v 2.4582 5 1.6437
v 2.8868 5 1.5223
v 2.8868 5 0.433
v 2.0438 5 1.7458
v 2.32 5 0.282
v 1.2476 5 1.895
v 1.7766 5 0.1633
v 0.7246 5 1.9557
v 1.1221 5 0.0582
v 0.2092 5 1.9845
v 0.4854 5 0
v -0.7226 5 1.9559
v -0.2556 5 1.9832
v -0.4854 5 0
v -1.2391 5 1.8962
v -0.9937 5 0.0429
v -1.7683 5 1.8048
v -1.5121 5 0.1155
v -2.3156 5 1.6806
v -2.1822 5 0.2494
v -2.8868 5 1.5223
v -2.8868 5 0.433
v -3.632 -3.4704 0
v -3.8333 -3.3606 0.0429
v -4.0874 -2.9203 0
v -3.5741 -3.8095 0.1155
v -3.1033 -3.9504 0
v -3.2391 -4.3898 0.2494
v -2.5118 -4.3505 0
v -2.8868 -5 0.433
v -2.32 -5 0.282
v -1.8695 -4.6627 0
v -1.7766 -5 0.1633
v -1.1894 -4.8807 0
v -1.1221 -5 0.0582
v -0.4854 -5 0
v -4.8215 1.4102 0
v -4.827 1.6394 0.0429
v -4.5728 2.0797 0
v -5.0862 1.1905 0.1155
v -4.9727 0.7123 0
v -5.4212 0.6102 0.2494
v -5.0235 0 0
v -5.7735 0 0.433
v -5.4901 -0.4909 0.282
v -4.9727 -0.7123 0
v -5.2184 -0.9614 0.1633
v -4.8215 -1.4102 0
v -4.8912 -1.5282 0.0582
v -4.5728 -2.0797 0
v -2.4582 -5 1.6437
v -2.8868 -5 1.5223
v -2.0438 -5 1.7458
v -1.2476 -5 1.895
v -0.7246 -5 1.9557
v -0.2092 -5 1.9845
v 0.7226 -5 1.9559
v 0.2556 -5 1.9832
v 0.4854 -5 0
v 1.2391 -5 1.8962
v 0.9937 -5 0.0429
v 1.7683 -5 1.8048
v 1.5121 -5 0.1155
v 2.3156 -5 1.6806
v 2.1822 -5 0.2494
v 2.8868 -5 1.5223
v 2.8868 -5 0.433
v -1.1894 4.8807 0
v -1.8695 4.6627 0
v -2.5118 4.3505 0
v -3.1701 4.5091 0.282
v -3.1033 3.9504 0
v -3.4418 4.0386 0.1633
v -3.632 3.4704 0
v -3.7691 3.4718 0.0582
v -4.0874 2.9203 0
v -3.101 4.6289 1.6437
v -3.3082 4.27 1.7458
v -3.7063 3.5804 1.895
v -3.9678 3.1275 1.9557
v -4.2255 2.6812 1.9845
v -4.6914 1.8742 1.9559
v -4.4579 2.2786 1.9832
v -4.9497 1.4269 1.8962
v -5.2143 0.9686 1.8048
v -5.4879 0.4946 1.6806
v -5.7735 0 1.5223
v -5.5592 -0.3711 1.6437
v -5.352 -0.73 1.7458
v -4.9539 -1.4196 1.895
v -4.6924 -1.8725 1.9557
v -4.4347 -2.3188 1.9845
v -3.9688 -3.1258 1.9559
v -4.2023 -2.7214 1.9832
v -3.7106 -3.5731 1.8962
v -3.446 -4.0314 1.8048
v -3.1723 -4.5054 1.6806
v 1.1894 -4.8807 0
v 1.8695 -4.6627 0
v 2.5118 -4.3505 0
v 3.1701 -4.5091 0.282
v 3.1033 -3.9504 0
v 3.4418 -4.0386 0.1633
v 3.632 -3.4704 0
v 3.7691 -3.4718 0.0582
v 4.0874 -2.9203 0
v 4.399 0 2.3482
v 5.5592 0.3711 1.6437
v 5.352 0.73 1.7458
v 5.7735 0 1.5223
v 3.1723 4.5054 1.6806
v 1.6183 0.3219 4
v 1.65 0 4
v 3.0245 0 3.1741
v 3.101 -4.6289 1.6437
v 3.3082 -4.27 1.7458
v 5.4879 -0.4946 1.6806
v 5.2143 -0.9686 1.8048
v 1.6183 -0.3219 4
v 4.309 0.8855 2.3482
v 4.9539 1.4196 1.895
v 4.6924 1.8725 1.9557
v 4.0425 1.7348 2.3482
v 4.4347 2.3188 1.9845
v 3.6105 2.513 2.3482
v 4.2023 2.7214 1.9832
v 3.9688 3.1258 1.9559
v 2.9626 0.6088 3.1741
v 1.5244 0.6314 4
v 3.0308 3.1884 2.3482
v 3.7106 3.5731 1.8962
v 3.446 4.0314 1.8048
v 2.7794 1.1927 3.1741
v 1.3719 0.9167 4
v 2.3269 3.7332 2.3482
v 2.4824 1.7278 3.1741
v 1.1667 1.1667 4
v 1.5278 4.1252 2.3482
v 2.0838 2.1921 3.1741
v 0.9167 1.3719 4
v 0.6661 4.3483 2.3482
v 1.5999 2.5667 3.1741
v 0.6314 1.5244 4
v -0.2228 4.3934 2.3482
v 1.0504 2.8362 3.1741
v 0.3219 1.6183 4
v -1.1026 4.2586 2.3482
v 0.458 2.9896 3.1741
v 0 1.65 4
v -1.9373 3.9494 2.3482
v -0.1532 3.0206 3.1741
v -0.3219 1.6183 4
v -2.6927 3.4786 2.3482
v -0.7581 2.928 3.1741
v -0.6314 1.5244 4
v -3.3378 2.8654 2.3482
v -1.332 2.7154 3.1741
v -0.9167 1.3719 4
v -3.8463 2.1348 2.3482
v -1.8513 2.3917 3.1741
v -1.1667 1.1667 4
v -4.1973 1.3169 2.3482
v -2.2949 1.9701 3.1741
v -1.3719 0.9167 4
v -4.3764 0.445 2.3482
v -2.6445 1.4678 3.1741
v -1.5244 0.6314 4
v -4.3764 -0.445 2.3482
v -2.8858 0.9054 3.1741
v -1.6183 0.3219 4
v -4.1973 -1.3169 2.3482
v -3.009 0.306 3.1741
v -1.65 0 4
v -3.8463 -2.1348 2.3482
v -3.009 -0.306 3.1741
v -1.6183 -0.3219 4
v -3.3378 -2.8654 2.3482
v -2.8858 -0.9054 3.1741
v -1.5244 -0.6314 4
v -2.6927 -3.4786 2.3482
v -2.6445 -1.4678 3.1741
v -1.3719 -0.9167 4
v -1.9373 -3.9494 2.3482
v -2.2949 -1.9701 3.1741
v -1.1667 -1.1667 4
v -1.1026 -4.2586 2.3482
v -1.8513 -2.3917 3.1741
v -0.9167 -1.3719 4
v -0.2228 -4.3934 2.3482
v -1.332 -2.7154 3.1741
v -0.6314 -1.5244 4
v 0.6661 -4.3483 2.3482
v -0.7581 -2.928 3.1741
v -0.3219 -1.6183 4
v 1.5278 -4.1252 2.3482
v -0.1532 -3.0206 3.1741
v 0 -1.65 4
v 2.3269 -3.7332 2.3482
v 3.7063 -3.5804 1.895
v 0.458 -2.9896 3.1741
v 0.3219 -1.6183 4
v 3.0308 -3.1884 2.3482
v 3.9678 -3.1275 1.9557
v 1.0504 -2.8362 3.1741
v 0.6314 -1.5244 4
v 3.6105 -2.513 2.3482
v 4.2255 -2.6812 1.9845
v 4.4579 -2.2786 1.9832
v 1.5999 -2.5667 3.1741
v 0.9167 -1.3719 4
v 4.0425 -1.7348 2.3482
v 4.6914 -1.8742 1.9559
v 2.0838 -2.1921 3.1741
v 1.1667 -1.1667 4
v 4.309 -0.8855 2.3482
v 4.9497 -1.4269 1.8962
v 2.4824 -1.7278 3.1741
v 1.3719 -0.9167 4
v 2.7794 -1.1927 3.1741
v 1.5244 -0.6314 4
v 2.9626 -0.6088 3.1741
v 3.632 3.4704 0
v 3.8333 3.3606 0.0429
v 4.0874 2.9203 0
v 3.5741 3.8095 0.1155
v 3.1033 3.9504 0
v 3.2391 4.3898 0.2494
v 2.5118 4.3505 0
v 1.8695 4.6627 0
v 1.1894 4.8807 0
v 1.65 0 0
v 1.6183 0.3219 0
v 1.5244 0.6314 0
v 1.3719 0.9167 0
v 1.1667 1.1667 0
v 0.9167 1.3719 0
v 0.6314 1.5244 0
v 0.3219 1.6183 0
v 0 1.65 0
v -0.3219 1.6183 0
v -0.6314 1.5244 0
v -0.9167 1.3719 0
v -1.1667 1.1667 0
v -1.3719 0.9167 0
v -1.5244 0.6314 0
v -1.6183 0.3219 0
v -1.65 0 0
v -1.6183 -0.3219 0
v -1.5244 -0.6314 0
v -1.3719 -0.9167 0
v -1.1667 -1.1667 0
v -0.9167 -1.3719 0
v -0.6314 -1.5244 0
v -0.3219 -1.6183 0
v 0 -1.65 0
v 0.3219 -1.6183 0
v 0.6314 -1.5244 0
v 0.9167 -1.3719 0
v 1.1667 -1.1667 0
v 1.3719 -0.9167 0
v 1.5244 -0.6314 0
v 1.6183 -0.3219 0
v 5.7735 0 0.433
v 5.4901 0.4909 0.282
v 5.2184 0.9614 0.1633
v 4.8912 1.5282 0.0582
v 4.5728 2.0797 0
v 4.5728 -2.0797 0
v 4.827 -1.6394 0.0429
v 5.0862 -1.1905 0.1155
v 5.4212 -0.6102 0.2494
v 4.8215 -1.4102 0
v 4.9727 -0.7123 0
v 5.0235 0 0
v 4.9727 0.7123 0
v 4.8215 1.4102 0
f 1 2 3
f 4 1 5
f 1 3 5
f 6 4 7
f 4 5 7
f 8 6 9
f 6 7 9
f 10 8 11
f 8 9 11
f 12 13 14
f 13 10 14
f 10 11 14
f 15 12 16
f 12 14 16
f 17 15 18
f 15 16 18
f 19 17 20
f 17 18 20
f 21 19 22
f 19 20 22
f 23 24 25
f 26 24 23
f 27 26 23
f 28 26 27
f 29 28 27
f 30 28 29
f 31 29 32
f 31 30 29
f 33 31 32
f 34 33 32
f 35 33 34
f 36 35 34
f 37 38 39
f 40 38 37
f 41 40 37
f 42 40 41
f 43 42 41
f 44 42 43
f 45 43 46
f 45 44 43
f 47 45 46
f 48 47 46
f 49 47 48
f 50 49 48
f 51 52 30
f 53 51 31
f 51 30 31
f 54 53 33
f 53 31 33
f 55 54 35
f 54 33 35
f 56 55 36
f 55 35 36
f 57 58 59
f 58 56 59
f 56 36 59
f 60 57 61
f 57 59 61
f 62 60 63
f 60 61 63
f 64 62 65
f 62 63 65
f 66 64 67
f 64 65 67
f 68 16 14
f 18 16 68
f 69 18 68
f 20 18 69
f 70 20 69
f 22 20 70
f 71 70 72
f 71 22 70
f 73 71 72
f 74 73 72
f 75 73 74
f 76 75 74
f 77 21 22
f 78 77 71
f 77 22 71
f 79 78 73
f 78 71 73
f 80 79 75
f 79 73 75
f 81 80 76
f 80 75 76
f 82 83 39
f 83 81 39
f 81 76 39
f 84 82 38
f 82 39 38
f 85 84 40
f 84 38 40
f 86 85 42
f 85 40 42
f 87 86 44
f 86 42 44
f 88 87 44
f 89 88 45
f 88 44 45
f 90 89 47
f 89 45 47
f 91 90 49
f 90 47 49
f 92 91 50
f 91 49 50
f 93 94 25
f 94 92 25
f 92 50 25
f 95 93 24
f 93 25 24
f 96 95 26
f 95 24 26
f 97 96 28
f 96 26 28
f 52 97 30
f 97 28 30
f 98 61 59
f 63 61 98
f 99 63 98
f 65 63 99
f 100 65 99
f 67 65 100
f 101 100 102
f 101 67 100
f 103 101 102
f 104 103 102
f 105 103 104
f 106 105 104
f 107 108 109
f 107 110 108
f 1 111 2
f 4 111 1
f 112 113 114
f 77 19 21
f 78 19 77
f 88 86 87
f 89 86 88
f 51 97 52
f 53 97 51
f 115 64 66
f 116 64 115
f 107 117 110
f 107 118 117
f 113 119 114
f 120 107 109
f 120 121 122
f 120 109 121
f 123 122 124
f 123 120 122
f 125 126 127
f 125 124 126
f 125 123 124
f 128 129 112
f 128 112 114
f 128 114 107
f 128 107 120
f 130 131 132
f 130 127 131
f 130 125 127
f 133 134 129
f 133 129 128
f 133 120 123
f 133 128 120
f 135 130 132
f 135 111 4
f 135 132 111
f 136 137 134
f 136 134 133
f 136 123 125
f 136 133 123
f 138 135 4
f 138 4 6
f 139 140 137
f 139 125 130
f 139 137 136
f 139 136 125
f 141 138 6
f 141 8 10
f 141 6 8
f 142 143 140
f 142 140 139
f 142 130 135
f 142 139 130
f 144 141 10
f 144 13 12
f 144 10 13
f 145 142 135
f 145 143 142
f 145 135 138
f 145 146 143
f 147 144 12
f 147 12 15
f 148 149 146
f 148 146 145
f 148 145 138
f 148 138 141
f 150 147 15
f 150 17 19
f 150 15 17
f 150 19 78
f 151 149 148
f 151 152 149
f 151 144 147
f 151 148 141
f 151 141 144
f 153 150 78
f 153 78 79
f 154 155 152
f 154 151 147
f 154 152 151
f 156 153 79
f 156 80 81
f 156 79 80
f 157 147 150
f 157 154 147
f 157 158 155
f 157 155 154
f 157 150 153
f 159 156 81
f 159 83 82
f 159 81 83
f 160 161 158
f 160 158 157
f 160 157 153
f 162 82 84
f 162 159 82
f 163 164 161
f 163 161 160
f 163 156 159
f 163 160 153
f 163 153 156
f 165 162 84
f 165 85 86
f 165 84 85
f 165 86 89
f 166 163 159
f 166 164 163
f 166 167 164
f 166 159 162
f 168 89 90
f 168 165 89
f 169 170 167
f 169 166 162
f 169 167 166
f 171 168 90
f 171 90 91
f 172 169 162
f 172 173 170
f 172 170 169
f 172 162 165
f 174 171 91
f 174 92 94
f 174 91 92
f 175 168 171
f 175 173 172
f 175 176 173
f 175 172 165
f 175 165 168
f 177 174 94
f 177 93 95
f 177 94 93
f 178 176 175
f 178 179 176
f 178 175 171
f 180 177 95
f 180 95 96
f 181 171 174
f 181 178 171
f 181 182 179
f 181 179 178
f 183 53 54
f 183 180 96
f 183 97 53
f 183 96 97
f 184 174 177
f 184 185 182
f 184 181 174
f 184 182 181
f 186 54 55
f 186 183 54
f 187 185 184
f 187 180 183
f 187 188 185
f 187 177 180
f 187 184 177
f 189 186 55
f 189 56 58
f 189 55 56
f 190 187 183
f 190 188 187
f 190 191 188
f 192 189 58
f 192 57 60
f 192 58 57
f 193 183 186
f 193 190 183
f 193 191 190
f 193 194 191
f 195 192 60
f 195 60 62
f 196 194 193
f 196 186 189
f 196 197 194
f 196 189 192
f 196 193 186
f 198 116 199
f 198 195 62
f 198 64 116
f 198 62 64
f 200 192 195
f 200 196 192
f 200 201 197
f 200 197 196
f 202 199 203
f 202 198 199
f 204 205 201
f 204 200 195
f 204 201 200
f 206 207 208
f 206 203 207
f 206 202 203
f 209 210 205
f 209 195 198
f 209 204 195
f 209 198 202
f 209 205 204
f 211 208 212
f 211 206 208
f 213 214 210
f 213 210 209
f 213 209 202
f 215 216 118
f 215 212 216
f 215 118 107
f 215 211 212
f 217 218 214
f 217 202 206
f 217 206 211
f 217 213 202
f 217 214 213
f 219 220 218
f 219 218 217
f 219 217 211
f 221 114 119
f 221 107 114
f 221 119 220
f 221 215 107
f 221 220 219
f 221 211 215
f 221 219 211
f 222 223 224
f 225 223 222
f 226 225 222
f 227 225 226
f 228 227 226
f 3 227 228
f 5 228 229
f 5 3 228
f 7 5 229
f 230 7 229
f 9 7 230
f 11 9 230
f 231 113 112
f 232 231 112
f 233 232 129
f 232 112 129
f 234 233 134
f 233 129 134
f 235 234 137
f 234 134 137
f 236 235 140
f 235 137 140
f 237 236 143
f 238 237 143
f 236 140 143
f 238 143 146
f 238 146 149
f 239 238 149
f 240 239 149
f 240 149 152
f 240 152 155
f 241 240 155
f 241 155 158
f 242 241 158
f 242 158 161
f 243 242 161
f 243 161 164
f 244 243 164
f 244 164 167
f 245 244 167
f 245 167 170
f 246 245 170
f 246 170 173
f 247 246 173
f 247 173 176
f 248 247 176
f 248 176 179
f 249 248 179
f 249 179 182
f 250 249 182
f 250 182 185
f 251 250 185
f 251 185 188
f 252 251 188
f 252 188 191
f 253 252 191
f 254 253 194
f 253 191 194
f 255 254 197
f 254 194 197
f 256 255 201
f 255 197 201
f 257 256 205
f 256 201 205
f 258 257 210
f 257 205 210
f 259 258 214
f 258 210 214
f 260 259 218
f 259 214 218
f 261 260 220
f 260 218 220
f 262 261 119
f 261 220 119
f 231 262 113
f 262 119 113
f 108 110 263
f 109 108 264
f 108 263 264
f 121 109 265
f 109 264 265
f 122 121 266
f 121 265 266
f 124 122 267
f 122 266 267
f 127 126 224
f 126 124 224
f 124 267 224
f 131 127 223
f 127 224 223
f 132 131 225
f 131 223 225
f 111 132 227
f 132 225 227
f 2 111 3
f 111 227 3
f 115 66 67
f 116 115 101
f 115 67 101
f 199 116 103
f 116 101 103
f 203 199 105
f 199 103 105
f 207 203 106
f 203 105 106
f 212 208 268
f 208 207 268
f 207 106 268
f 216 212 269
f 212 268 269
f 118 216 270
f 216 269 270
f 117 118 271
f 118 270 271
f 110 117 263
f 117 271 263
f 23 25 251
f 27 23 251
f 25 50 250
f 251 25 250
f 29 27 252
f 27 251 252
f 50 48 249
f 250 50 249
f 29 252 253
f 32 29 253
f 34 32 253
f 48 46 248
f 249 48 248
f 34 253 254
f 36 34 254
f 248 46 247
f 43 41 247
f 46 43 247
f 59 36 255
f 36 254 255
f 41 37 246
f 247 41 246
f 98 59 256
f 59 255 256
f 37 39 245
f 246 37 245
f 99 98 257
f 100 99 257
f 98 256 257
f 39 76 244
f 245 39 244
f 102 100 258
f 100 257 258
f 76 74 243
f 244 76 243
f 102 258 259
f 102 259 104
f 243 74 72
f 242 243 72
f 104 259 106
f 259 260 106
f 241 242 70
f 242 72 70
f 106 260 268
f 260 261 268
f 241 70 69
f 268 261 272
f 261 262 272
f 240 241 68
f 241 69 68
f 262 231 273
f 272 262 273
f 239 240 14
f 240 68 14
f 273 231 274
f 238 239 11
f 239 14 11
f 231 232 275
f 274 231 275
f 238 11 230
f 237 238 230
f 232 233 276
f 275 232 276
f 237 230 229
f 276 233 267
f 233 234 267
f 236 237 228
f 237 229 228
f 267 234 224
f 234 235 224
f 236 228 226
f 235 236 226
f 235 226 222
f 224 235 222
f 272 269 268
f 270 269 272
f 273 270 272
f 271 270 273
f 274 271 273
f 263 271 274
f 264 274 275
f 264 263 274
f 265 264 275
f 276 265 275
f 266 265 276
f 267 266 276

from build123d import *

# Parameters (mm, degrees)
BOSS_EXTRUDE1_DEPTH   = 4
M4X0_7_TAPPED_HOLE1_D = 3.3


with BuildPart() as part:
    # Sketch1 → Boss-Extrude1 (new body)
    with BuildSketch(Plane.XY):
        Polygon((-2.886751346, 5), (-5.773502692, 0), (-2.886751346, -5), (2.886751346, -5), (5.773502692, 0), (2.886751346, 5), align=None)
    extrude(amount=BOSS_EXTRUDE1_DEPTH)

    # M4x0.7 Tapped Hole1 (through all)
    with Locations(Plane(origin=(0, 0, 0), x_dir=(-1, 0, 0), z_dir=(0, 0, -1))):
        with Locations((0, 0)):
            Hole(M4X0_7_TAPPED_HOLE1_D / 2)

    # Sketch3 → Cut-Revolve3 (revolve, cut)
    with BuildSketch(Plane(origin=(0, 0, 0), x_dir=(1, 0, 0), z_dir=(0, 1, 0))):
        Polygon((6.057291813, -1.351831913), (1.65, -4), (6.057291813, -4), align=None)
    revolve(axis=Axis((0, 0, 4), (0, 0, 1)), mode=Mode.SUBTRACT)

    # Sketch5 → Cut-Revolve4 (revolve, cut)
    with BuildSketch(Plane(origin=(0, 0, 0), x_dir=(1, 0, 0), z_dir=(0, 1, 0))):
        Polygon((5.023502692, 0), (5.773502692, -0.433012702), (5.773502692, 0), align=None)
    revolve(axis=Axis((0, 0, 0), (0, 0, 1)), mode=Mode.SUBTRACT)


solid = part.part
